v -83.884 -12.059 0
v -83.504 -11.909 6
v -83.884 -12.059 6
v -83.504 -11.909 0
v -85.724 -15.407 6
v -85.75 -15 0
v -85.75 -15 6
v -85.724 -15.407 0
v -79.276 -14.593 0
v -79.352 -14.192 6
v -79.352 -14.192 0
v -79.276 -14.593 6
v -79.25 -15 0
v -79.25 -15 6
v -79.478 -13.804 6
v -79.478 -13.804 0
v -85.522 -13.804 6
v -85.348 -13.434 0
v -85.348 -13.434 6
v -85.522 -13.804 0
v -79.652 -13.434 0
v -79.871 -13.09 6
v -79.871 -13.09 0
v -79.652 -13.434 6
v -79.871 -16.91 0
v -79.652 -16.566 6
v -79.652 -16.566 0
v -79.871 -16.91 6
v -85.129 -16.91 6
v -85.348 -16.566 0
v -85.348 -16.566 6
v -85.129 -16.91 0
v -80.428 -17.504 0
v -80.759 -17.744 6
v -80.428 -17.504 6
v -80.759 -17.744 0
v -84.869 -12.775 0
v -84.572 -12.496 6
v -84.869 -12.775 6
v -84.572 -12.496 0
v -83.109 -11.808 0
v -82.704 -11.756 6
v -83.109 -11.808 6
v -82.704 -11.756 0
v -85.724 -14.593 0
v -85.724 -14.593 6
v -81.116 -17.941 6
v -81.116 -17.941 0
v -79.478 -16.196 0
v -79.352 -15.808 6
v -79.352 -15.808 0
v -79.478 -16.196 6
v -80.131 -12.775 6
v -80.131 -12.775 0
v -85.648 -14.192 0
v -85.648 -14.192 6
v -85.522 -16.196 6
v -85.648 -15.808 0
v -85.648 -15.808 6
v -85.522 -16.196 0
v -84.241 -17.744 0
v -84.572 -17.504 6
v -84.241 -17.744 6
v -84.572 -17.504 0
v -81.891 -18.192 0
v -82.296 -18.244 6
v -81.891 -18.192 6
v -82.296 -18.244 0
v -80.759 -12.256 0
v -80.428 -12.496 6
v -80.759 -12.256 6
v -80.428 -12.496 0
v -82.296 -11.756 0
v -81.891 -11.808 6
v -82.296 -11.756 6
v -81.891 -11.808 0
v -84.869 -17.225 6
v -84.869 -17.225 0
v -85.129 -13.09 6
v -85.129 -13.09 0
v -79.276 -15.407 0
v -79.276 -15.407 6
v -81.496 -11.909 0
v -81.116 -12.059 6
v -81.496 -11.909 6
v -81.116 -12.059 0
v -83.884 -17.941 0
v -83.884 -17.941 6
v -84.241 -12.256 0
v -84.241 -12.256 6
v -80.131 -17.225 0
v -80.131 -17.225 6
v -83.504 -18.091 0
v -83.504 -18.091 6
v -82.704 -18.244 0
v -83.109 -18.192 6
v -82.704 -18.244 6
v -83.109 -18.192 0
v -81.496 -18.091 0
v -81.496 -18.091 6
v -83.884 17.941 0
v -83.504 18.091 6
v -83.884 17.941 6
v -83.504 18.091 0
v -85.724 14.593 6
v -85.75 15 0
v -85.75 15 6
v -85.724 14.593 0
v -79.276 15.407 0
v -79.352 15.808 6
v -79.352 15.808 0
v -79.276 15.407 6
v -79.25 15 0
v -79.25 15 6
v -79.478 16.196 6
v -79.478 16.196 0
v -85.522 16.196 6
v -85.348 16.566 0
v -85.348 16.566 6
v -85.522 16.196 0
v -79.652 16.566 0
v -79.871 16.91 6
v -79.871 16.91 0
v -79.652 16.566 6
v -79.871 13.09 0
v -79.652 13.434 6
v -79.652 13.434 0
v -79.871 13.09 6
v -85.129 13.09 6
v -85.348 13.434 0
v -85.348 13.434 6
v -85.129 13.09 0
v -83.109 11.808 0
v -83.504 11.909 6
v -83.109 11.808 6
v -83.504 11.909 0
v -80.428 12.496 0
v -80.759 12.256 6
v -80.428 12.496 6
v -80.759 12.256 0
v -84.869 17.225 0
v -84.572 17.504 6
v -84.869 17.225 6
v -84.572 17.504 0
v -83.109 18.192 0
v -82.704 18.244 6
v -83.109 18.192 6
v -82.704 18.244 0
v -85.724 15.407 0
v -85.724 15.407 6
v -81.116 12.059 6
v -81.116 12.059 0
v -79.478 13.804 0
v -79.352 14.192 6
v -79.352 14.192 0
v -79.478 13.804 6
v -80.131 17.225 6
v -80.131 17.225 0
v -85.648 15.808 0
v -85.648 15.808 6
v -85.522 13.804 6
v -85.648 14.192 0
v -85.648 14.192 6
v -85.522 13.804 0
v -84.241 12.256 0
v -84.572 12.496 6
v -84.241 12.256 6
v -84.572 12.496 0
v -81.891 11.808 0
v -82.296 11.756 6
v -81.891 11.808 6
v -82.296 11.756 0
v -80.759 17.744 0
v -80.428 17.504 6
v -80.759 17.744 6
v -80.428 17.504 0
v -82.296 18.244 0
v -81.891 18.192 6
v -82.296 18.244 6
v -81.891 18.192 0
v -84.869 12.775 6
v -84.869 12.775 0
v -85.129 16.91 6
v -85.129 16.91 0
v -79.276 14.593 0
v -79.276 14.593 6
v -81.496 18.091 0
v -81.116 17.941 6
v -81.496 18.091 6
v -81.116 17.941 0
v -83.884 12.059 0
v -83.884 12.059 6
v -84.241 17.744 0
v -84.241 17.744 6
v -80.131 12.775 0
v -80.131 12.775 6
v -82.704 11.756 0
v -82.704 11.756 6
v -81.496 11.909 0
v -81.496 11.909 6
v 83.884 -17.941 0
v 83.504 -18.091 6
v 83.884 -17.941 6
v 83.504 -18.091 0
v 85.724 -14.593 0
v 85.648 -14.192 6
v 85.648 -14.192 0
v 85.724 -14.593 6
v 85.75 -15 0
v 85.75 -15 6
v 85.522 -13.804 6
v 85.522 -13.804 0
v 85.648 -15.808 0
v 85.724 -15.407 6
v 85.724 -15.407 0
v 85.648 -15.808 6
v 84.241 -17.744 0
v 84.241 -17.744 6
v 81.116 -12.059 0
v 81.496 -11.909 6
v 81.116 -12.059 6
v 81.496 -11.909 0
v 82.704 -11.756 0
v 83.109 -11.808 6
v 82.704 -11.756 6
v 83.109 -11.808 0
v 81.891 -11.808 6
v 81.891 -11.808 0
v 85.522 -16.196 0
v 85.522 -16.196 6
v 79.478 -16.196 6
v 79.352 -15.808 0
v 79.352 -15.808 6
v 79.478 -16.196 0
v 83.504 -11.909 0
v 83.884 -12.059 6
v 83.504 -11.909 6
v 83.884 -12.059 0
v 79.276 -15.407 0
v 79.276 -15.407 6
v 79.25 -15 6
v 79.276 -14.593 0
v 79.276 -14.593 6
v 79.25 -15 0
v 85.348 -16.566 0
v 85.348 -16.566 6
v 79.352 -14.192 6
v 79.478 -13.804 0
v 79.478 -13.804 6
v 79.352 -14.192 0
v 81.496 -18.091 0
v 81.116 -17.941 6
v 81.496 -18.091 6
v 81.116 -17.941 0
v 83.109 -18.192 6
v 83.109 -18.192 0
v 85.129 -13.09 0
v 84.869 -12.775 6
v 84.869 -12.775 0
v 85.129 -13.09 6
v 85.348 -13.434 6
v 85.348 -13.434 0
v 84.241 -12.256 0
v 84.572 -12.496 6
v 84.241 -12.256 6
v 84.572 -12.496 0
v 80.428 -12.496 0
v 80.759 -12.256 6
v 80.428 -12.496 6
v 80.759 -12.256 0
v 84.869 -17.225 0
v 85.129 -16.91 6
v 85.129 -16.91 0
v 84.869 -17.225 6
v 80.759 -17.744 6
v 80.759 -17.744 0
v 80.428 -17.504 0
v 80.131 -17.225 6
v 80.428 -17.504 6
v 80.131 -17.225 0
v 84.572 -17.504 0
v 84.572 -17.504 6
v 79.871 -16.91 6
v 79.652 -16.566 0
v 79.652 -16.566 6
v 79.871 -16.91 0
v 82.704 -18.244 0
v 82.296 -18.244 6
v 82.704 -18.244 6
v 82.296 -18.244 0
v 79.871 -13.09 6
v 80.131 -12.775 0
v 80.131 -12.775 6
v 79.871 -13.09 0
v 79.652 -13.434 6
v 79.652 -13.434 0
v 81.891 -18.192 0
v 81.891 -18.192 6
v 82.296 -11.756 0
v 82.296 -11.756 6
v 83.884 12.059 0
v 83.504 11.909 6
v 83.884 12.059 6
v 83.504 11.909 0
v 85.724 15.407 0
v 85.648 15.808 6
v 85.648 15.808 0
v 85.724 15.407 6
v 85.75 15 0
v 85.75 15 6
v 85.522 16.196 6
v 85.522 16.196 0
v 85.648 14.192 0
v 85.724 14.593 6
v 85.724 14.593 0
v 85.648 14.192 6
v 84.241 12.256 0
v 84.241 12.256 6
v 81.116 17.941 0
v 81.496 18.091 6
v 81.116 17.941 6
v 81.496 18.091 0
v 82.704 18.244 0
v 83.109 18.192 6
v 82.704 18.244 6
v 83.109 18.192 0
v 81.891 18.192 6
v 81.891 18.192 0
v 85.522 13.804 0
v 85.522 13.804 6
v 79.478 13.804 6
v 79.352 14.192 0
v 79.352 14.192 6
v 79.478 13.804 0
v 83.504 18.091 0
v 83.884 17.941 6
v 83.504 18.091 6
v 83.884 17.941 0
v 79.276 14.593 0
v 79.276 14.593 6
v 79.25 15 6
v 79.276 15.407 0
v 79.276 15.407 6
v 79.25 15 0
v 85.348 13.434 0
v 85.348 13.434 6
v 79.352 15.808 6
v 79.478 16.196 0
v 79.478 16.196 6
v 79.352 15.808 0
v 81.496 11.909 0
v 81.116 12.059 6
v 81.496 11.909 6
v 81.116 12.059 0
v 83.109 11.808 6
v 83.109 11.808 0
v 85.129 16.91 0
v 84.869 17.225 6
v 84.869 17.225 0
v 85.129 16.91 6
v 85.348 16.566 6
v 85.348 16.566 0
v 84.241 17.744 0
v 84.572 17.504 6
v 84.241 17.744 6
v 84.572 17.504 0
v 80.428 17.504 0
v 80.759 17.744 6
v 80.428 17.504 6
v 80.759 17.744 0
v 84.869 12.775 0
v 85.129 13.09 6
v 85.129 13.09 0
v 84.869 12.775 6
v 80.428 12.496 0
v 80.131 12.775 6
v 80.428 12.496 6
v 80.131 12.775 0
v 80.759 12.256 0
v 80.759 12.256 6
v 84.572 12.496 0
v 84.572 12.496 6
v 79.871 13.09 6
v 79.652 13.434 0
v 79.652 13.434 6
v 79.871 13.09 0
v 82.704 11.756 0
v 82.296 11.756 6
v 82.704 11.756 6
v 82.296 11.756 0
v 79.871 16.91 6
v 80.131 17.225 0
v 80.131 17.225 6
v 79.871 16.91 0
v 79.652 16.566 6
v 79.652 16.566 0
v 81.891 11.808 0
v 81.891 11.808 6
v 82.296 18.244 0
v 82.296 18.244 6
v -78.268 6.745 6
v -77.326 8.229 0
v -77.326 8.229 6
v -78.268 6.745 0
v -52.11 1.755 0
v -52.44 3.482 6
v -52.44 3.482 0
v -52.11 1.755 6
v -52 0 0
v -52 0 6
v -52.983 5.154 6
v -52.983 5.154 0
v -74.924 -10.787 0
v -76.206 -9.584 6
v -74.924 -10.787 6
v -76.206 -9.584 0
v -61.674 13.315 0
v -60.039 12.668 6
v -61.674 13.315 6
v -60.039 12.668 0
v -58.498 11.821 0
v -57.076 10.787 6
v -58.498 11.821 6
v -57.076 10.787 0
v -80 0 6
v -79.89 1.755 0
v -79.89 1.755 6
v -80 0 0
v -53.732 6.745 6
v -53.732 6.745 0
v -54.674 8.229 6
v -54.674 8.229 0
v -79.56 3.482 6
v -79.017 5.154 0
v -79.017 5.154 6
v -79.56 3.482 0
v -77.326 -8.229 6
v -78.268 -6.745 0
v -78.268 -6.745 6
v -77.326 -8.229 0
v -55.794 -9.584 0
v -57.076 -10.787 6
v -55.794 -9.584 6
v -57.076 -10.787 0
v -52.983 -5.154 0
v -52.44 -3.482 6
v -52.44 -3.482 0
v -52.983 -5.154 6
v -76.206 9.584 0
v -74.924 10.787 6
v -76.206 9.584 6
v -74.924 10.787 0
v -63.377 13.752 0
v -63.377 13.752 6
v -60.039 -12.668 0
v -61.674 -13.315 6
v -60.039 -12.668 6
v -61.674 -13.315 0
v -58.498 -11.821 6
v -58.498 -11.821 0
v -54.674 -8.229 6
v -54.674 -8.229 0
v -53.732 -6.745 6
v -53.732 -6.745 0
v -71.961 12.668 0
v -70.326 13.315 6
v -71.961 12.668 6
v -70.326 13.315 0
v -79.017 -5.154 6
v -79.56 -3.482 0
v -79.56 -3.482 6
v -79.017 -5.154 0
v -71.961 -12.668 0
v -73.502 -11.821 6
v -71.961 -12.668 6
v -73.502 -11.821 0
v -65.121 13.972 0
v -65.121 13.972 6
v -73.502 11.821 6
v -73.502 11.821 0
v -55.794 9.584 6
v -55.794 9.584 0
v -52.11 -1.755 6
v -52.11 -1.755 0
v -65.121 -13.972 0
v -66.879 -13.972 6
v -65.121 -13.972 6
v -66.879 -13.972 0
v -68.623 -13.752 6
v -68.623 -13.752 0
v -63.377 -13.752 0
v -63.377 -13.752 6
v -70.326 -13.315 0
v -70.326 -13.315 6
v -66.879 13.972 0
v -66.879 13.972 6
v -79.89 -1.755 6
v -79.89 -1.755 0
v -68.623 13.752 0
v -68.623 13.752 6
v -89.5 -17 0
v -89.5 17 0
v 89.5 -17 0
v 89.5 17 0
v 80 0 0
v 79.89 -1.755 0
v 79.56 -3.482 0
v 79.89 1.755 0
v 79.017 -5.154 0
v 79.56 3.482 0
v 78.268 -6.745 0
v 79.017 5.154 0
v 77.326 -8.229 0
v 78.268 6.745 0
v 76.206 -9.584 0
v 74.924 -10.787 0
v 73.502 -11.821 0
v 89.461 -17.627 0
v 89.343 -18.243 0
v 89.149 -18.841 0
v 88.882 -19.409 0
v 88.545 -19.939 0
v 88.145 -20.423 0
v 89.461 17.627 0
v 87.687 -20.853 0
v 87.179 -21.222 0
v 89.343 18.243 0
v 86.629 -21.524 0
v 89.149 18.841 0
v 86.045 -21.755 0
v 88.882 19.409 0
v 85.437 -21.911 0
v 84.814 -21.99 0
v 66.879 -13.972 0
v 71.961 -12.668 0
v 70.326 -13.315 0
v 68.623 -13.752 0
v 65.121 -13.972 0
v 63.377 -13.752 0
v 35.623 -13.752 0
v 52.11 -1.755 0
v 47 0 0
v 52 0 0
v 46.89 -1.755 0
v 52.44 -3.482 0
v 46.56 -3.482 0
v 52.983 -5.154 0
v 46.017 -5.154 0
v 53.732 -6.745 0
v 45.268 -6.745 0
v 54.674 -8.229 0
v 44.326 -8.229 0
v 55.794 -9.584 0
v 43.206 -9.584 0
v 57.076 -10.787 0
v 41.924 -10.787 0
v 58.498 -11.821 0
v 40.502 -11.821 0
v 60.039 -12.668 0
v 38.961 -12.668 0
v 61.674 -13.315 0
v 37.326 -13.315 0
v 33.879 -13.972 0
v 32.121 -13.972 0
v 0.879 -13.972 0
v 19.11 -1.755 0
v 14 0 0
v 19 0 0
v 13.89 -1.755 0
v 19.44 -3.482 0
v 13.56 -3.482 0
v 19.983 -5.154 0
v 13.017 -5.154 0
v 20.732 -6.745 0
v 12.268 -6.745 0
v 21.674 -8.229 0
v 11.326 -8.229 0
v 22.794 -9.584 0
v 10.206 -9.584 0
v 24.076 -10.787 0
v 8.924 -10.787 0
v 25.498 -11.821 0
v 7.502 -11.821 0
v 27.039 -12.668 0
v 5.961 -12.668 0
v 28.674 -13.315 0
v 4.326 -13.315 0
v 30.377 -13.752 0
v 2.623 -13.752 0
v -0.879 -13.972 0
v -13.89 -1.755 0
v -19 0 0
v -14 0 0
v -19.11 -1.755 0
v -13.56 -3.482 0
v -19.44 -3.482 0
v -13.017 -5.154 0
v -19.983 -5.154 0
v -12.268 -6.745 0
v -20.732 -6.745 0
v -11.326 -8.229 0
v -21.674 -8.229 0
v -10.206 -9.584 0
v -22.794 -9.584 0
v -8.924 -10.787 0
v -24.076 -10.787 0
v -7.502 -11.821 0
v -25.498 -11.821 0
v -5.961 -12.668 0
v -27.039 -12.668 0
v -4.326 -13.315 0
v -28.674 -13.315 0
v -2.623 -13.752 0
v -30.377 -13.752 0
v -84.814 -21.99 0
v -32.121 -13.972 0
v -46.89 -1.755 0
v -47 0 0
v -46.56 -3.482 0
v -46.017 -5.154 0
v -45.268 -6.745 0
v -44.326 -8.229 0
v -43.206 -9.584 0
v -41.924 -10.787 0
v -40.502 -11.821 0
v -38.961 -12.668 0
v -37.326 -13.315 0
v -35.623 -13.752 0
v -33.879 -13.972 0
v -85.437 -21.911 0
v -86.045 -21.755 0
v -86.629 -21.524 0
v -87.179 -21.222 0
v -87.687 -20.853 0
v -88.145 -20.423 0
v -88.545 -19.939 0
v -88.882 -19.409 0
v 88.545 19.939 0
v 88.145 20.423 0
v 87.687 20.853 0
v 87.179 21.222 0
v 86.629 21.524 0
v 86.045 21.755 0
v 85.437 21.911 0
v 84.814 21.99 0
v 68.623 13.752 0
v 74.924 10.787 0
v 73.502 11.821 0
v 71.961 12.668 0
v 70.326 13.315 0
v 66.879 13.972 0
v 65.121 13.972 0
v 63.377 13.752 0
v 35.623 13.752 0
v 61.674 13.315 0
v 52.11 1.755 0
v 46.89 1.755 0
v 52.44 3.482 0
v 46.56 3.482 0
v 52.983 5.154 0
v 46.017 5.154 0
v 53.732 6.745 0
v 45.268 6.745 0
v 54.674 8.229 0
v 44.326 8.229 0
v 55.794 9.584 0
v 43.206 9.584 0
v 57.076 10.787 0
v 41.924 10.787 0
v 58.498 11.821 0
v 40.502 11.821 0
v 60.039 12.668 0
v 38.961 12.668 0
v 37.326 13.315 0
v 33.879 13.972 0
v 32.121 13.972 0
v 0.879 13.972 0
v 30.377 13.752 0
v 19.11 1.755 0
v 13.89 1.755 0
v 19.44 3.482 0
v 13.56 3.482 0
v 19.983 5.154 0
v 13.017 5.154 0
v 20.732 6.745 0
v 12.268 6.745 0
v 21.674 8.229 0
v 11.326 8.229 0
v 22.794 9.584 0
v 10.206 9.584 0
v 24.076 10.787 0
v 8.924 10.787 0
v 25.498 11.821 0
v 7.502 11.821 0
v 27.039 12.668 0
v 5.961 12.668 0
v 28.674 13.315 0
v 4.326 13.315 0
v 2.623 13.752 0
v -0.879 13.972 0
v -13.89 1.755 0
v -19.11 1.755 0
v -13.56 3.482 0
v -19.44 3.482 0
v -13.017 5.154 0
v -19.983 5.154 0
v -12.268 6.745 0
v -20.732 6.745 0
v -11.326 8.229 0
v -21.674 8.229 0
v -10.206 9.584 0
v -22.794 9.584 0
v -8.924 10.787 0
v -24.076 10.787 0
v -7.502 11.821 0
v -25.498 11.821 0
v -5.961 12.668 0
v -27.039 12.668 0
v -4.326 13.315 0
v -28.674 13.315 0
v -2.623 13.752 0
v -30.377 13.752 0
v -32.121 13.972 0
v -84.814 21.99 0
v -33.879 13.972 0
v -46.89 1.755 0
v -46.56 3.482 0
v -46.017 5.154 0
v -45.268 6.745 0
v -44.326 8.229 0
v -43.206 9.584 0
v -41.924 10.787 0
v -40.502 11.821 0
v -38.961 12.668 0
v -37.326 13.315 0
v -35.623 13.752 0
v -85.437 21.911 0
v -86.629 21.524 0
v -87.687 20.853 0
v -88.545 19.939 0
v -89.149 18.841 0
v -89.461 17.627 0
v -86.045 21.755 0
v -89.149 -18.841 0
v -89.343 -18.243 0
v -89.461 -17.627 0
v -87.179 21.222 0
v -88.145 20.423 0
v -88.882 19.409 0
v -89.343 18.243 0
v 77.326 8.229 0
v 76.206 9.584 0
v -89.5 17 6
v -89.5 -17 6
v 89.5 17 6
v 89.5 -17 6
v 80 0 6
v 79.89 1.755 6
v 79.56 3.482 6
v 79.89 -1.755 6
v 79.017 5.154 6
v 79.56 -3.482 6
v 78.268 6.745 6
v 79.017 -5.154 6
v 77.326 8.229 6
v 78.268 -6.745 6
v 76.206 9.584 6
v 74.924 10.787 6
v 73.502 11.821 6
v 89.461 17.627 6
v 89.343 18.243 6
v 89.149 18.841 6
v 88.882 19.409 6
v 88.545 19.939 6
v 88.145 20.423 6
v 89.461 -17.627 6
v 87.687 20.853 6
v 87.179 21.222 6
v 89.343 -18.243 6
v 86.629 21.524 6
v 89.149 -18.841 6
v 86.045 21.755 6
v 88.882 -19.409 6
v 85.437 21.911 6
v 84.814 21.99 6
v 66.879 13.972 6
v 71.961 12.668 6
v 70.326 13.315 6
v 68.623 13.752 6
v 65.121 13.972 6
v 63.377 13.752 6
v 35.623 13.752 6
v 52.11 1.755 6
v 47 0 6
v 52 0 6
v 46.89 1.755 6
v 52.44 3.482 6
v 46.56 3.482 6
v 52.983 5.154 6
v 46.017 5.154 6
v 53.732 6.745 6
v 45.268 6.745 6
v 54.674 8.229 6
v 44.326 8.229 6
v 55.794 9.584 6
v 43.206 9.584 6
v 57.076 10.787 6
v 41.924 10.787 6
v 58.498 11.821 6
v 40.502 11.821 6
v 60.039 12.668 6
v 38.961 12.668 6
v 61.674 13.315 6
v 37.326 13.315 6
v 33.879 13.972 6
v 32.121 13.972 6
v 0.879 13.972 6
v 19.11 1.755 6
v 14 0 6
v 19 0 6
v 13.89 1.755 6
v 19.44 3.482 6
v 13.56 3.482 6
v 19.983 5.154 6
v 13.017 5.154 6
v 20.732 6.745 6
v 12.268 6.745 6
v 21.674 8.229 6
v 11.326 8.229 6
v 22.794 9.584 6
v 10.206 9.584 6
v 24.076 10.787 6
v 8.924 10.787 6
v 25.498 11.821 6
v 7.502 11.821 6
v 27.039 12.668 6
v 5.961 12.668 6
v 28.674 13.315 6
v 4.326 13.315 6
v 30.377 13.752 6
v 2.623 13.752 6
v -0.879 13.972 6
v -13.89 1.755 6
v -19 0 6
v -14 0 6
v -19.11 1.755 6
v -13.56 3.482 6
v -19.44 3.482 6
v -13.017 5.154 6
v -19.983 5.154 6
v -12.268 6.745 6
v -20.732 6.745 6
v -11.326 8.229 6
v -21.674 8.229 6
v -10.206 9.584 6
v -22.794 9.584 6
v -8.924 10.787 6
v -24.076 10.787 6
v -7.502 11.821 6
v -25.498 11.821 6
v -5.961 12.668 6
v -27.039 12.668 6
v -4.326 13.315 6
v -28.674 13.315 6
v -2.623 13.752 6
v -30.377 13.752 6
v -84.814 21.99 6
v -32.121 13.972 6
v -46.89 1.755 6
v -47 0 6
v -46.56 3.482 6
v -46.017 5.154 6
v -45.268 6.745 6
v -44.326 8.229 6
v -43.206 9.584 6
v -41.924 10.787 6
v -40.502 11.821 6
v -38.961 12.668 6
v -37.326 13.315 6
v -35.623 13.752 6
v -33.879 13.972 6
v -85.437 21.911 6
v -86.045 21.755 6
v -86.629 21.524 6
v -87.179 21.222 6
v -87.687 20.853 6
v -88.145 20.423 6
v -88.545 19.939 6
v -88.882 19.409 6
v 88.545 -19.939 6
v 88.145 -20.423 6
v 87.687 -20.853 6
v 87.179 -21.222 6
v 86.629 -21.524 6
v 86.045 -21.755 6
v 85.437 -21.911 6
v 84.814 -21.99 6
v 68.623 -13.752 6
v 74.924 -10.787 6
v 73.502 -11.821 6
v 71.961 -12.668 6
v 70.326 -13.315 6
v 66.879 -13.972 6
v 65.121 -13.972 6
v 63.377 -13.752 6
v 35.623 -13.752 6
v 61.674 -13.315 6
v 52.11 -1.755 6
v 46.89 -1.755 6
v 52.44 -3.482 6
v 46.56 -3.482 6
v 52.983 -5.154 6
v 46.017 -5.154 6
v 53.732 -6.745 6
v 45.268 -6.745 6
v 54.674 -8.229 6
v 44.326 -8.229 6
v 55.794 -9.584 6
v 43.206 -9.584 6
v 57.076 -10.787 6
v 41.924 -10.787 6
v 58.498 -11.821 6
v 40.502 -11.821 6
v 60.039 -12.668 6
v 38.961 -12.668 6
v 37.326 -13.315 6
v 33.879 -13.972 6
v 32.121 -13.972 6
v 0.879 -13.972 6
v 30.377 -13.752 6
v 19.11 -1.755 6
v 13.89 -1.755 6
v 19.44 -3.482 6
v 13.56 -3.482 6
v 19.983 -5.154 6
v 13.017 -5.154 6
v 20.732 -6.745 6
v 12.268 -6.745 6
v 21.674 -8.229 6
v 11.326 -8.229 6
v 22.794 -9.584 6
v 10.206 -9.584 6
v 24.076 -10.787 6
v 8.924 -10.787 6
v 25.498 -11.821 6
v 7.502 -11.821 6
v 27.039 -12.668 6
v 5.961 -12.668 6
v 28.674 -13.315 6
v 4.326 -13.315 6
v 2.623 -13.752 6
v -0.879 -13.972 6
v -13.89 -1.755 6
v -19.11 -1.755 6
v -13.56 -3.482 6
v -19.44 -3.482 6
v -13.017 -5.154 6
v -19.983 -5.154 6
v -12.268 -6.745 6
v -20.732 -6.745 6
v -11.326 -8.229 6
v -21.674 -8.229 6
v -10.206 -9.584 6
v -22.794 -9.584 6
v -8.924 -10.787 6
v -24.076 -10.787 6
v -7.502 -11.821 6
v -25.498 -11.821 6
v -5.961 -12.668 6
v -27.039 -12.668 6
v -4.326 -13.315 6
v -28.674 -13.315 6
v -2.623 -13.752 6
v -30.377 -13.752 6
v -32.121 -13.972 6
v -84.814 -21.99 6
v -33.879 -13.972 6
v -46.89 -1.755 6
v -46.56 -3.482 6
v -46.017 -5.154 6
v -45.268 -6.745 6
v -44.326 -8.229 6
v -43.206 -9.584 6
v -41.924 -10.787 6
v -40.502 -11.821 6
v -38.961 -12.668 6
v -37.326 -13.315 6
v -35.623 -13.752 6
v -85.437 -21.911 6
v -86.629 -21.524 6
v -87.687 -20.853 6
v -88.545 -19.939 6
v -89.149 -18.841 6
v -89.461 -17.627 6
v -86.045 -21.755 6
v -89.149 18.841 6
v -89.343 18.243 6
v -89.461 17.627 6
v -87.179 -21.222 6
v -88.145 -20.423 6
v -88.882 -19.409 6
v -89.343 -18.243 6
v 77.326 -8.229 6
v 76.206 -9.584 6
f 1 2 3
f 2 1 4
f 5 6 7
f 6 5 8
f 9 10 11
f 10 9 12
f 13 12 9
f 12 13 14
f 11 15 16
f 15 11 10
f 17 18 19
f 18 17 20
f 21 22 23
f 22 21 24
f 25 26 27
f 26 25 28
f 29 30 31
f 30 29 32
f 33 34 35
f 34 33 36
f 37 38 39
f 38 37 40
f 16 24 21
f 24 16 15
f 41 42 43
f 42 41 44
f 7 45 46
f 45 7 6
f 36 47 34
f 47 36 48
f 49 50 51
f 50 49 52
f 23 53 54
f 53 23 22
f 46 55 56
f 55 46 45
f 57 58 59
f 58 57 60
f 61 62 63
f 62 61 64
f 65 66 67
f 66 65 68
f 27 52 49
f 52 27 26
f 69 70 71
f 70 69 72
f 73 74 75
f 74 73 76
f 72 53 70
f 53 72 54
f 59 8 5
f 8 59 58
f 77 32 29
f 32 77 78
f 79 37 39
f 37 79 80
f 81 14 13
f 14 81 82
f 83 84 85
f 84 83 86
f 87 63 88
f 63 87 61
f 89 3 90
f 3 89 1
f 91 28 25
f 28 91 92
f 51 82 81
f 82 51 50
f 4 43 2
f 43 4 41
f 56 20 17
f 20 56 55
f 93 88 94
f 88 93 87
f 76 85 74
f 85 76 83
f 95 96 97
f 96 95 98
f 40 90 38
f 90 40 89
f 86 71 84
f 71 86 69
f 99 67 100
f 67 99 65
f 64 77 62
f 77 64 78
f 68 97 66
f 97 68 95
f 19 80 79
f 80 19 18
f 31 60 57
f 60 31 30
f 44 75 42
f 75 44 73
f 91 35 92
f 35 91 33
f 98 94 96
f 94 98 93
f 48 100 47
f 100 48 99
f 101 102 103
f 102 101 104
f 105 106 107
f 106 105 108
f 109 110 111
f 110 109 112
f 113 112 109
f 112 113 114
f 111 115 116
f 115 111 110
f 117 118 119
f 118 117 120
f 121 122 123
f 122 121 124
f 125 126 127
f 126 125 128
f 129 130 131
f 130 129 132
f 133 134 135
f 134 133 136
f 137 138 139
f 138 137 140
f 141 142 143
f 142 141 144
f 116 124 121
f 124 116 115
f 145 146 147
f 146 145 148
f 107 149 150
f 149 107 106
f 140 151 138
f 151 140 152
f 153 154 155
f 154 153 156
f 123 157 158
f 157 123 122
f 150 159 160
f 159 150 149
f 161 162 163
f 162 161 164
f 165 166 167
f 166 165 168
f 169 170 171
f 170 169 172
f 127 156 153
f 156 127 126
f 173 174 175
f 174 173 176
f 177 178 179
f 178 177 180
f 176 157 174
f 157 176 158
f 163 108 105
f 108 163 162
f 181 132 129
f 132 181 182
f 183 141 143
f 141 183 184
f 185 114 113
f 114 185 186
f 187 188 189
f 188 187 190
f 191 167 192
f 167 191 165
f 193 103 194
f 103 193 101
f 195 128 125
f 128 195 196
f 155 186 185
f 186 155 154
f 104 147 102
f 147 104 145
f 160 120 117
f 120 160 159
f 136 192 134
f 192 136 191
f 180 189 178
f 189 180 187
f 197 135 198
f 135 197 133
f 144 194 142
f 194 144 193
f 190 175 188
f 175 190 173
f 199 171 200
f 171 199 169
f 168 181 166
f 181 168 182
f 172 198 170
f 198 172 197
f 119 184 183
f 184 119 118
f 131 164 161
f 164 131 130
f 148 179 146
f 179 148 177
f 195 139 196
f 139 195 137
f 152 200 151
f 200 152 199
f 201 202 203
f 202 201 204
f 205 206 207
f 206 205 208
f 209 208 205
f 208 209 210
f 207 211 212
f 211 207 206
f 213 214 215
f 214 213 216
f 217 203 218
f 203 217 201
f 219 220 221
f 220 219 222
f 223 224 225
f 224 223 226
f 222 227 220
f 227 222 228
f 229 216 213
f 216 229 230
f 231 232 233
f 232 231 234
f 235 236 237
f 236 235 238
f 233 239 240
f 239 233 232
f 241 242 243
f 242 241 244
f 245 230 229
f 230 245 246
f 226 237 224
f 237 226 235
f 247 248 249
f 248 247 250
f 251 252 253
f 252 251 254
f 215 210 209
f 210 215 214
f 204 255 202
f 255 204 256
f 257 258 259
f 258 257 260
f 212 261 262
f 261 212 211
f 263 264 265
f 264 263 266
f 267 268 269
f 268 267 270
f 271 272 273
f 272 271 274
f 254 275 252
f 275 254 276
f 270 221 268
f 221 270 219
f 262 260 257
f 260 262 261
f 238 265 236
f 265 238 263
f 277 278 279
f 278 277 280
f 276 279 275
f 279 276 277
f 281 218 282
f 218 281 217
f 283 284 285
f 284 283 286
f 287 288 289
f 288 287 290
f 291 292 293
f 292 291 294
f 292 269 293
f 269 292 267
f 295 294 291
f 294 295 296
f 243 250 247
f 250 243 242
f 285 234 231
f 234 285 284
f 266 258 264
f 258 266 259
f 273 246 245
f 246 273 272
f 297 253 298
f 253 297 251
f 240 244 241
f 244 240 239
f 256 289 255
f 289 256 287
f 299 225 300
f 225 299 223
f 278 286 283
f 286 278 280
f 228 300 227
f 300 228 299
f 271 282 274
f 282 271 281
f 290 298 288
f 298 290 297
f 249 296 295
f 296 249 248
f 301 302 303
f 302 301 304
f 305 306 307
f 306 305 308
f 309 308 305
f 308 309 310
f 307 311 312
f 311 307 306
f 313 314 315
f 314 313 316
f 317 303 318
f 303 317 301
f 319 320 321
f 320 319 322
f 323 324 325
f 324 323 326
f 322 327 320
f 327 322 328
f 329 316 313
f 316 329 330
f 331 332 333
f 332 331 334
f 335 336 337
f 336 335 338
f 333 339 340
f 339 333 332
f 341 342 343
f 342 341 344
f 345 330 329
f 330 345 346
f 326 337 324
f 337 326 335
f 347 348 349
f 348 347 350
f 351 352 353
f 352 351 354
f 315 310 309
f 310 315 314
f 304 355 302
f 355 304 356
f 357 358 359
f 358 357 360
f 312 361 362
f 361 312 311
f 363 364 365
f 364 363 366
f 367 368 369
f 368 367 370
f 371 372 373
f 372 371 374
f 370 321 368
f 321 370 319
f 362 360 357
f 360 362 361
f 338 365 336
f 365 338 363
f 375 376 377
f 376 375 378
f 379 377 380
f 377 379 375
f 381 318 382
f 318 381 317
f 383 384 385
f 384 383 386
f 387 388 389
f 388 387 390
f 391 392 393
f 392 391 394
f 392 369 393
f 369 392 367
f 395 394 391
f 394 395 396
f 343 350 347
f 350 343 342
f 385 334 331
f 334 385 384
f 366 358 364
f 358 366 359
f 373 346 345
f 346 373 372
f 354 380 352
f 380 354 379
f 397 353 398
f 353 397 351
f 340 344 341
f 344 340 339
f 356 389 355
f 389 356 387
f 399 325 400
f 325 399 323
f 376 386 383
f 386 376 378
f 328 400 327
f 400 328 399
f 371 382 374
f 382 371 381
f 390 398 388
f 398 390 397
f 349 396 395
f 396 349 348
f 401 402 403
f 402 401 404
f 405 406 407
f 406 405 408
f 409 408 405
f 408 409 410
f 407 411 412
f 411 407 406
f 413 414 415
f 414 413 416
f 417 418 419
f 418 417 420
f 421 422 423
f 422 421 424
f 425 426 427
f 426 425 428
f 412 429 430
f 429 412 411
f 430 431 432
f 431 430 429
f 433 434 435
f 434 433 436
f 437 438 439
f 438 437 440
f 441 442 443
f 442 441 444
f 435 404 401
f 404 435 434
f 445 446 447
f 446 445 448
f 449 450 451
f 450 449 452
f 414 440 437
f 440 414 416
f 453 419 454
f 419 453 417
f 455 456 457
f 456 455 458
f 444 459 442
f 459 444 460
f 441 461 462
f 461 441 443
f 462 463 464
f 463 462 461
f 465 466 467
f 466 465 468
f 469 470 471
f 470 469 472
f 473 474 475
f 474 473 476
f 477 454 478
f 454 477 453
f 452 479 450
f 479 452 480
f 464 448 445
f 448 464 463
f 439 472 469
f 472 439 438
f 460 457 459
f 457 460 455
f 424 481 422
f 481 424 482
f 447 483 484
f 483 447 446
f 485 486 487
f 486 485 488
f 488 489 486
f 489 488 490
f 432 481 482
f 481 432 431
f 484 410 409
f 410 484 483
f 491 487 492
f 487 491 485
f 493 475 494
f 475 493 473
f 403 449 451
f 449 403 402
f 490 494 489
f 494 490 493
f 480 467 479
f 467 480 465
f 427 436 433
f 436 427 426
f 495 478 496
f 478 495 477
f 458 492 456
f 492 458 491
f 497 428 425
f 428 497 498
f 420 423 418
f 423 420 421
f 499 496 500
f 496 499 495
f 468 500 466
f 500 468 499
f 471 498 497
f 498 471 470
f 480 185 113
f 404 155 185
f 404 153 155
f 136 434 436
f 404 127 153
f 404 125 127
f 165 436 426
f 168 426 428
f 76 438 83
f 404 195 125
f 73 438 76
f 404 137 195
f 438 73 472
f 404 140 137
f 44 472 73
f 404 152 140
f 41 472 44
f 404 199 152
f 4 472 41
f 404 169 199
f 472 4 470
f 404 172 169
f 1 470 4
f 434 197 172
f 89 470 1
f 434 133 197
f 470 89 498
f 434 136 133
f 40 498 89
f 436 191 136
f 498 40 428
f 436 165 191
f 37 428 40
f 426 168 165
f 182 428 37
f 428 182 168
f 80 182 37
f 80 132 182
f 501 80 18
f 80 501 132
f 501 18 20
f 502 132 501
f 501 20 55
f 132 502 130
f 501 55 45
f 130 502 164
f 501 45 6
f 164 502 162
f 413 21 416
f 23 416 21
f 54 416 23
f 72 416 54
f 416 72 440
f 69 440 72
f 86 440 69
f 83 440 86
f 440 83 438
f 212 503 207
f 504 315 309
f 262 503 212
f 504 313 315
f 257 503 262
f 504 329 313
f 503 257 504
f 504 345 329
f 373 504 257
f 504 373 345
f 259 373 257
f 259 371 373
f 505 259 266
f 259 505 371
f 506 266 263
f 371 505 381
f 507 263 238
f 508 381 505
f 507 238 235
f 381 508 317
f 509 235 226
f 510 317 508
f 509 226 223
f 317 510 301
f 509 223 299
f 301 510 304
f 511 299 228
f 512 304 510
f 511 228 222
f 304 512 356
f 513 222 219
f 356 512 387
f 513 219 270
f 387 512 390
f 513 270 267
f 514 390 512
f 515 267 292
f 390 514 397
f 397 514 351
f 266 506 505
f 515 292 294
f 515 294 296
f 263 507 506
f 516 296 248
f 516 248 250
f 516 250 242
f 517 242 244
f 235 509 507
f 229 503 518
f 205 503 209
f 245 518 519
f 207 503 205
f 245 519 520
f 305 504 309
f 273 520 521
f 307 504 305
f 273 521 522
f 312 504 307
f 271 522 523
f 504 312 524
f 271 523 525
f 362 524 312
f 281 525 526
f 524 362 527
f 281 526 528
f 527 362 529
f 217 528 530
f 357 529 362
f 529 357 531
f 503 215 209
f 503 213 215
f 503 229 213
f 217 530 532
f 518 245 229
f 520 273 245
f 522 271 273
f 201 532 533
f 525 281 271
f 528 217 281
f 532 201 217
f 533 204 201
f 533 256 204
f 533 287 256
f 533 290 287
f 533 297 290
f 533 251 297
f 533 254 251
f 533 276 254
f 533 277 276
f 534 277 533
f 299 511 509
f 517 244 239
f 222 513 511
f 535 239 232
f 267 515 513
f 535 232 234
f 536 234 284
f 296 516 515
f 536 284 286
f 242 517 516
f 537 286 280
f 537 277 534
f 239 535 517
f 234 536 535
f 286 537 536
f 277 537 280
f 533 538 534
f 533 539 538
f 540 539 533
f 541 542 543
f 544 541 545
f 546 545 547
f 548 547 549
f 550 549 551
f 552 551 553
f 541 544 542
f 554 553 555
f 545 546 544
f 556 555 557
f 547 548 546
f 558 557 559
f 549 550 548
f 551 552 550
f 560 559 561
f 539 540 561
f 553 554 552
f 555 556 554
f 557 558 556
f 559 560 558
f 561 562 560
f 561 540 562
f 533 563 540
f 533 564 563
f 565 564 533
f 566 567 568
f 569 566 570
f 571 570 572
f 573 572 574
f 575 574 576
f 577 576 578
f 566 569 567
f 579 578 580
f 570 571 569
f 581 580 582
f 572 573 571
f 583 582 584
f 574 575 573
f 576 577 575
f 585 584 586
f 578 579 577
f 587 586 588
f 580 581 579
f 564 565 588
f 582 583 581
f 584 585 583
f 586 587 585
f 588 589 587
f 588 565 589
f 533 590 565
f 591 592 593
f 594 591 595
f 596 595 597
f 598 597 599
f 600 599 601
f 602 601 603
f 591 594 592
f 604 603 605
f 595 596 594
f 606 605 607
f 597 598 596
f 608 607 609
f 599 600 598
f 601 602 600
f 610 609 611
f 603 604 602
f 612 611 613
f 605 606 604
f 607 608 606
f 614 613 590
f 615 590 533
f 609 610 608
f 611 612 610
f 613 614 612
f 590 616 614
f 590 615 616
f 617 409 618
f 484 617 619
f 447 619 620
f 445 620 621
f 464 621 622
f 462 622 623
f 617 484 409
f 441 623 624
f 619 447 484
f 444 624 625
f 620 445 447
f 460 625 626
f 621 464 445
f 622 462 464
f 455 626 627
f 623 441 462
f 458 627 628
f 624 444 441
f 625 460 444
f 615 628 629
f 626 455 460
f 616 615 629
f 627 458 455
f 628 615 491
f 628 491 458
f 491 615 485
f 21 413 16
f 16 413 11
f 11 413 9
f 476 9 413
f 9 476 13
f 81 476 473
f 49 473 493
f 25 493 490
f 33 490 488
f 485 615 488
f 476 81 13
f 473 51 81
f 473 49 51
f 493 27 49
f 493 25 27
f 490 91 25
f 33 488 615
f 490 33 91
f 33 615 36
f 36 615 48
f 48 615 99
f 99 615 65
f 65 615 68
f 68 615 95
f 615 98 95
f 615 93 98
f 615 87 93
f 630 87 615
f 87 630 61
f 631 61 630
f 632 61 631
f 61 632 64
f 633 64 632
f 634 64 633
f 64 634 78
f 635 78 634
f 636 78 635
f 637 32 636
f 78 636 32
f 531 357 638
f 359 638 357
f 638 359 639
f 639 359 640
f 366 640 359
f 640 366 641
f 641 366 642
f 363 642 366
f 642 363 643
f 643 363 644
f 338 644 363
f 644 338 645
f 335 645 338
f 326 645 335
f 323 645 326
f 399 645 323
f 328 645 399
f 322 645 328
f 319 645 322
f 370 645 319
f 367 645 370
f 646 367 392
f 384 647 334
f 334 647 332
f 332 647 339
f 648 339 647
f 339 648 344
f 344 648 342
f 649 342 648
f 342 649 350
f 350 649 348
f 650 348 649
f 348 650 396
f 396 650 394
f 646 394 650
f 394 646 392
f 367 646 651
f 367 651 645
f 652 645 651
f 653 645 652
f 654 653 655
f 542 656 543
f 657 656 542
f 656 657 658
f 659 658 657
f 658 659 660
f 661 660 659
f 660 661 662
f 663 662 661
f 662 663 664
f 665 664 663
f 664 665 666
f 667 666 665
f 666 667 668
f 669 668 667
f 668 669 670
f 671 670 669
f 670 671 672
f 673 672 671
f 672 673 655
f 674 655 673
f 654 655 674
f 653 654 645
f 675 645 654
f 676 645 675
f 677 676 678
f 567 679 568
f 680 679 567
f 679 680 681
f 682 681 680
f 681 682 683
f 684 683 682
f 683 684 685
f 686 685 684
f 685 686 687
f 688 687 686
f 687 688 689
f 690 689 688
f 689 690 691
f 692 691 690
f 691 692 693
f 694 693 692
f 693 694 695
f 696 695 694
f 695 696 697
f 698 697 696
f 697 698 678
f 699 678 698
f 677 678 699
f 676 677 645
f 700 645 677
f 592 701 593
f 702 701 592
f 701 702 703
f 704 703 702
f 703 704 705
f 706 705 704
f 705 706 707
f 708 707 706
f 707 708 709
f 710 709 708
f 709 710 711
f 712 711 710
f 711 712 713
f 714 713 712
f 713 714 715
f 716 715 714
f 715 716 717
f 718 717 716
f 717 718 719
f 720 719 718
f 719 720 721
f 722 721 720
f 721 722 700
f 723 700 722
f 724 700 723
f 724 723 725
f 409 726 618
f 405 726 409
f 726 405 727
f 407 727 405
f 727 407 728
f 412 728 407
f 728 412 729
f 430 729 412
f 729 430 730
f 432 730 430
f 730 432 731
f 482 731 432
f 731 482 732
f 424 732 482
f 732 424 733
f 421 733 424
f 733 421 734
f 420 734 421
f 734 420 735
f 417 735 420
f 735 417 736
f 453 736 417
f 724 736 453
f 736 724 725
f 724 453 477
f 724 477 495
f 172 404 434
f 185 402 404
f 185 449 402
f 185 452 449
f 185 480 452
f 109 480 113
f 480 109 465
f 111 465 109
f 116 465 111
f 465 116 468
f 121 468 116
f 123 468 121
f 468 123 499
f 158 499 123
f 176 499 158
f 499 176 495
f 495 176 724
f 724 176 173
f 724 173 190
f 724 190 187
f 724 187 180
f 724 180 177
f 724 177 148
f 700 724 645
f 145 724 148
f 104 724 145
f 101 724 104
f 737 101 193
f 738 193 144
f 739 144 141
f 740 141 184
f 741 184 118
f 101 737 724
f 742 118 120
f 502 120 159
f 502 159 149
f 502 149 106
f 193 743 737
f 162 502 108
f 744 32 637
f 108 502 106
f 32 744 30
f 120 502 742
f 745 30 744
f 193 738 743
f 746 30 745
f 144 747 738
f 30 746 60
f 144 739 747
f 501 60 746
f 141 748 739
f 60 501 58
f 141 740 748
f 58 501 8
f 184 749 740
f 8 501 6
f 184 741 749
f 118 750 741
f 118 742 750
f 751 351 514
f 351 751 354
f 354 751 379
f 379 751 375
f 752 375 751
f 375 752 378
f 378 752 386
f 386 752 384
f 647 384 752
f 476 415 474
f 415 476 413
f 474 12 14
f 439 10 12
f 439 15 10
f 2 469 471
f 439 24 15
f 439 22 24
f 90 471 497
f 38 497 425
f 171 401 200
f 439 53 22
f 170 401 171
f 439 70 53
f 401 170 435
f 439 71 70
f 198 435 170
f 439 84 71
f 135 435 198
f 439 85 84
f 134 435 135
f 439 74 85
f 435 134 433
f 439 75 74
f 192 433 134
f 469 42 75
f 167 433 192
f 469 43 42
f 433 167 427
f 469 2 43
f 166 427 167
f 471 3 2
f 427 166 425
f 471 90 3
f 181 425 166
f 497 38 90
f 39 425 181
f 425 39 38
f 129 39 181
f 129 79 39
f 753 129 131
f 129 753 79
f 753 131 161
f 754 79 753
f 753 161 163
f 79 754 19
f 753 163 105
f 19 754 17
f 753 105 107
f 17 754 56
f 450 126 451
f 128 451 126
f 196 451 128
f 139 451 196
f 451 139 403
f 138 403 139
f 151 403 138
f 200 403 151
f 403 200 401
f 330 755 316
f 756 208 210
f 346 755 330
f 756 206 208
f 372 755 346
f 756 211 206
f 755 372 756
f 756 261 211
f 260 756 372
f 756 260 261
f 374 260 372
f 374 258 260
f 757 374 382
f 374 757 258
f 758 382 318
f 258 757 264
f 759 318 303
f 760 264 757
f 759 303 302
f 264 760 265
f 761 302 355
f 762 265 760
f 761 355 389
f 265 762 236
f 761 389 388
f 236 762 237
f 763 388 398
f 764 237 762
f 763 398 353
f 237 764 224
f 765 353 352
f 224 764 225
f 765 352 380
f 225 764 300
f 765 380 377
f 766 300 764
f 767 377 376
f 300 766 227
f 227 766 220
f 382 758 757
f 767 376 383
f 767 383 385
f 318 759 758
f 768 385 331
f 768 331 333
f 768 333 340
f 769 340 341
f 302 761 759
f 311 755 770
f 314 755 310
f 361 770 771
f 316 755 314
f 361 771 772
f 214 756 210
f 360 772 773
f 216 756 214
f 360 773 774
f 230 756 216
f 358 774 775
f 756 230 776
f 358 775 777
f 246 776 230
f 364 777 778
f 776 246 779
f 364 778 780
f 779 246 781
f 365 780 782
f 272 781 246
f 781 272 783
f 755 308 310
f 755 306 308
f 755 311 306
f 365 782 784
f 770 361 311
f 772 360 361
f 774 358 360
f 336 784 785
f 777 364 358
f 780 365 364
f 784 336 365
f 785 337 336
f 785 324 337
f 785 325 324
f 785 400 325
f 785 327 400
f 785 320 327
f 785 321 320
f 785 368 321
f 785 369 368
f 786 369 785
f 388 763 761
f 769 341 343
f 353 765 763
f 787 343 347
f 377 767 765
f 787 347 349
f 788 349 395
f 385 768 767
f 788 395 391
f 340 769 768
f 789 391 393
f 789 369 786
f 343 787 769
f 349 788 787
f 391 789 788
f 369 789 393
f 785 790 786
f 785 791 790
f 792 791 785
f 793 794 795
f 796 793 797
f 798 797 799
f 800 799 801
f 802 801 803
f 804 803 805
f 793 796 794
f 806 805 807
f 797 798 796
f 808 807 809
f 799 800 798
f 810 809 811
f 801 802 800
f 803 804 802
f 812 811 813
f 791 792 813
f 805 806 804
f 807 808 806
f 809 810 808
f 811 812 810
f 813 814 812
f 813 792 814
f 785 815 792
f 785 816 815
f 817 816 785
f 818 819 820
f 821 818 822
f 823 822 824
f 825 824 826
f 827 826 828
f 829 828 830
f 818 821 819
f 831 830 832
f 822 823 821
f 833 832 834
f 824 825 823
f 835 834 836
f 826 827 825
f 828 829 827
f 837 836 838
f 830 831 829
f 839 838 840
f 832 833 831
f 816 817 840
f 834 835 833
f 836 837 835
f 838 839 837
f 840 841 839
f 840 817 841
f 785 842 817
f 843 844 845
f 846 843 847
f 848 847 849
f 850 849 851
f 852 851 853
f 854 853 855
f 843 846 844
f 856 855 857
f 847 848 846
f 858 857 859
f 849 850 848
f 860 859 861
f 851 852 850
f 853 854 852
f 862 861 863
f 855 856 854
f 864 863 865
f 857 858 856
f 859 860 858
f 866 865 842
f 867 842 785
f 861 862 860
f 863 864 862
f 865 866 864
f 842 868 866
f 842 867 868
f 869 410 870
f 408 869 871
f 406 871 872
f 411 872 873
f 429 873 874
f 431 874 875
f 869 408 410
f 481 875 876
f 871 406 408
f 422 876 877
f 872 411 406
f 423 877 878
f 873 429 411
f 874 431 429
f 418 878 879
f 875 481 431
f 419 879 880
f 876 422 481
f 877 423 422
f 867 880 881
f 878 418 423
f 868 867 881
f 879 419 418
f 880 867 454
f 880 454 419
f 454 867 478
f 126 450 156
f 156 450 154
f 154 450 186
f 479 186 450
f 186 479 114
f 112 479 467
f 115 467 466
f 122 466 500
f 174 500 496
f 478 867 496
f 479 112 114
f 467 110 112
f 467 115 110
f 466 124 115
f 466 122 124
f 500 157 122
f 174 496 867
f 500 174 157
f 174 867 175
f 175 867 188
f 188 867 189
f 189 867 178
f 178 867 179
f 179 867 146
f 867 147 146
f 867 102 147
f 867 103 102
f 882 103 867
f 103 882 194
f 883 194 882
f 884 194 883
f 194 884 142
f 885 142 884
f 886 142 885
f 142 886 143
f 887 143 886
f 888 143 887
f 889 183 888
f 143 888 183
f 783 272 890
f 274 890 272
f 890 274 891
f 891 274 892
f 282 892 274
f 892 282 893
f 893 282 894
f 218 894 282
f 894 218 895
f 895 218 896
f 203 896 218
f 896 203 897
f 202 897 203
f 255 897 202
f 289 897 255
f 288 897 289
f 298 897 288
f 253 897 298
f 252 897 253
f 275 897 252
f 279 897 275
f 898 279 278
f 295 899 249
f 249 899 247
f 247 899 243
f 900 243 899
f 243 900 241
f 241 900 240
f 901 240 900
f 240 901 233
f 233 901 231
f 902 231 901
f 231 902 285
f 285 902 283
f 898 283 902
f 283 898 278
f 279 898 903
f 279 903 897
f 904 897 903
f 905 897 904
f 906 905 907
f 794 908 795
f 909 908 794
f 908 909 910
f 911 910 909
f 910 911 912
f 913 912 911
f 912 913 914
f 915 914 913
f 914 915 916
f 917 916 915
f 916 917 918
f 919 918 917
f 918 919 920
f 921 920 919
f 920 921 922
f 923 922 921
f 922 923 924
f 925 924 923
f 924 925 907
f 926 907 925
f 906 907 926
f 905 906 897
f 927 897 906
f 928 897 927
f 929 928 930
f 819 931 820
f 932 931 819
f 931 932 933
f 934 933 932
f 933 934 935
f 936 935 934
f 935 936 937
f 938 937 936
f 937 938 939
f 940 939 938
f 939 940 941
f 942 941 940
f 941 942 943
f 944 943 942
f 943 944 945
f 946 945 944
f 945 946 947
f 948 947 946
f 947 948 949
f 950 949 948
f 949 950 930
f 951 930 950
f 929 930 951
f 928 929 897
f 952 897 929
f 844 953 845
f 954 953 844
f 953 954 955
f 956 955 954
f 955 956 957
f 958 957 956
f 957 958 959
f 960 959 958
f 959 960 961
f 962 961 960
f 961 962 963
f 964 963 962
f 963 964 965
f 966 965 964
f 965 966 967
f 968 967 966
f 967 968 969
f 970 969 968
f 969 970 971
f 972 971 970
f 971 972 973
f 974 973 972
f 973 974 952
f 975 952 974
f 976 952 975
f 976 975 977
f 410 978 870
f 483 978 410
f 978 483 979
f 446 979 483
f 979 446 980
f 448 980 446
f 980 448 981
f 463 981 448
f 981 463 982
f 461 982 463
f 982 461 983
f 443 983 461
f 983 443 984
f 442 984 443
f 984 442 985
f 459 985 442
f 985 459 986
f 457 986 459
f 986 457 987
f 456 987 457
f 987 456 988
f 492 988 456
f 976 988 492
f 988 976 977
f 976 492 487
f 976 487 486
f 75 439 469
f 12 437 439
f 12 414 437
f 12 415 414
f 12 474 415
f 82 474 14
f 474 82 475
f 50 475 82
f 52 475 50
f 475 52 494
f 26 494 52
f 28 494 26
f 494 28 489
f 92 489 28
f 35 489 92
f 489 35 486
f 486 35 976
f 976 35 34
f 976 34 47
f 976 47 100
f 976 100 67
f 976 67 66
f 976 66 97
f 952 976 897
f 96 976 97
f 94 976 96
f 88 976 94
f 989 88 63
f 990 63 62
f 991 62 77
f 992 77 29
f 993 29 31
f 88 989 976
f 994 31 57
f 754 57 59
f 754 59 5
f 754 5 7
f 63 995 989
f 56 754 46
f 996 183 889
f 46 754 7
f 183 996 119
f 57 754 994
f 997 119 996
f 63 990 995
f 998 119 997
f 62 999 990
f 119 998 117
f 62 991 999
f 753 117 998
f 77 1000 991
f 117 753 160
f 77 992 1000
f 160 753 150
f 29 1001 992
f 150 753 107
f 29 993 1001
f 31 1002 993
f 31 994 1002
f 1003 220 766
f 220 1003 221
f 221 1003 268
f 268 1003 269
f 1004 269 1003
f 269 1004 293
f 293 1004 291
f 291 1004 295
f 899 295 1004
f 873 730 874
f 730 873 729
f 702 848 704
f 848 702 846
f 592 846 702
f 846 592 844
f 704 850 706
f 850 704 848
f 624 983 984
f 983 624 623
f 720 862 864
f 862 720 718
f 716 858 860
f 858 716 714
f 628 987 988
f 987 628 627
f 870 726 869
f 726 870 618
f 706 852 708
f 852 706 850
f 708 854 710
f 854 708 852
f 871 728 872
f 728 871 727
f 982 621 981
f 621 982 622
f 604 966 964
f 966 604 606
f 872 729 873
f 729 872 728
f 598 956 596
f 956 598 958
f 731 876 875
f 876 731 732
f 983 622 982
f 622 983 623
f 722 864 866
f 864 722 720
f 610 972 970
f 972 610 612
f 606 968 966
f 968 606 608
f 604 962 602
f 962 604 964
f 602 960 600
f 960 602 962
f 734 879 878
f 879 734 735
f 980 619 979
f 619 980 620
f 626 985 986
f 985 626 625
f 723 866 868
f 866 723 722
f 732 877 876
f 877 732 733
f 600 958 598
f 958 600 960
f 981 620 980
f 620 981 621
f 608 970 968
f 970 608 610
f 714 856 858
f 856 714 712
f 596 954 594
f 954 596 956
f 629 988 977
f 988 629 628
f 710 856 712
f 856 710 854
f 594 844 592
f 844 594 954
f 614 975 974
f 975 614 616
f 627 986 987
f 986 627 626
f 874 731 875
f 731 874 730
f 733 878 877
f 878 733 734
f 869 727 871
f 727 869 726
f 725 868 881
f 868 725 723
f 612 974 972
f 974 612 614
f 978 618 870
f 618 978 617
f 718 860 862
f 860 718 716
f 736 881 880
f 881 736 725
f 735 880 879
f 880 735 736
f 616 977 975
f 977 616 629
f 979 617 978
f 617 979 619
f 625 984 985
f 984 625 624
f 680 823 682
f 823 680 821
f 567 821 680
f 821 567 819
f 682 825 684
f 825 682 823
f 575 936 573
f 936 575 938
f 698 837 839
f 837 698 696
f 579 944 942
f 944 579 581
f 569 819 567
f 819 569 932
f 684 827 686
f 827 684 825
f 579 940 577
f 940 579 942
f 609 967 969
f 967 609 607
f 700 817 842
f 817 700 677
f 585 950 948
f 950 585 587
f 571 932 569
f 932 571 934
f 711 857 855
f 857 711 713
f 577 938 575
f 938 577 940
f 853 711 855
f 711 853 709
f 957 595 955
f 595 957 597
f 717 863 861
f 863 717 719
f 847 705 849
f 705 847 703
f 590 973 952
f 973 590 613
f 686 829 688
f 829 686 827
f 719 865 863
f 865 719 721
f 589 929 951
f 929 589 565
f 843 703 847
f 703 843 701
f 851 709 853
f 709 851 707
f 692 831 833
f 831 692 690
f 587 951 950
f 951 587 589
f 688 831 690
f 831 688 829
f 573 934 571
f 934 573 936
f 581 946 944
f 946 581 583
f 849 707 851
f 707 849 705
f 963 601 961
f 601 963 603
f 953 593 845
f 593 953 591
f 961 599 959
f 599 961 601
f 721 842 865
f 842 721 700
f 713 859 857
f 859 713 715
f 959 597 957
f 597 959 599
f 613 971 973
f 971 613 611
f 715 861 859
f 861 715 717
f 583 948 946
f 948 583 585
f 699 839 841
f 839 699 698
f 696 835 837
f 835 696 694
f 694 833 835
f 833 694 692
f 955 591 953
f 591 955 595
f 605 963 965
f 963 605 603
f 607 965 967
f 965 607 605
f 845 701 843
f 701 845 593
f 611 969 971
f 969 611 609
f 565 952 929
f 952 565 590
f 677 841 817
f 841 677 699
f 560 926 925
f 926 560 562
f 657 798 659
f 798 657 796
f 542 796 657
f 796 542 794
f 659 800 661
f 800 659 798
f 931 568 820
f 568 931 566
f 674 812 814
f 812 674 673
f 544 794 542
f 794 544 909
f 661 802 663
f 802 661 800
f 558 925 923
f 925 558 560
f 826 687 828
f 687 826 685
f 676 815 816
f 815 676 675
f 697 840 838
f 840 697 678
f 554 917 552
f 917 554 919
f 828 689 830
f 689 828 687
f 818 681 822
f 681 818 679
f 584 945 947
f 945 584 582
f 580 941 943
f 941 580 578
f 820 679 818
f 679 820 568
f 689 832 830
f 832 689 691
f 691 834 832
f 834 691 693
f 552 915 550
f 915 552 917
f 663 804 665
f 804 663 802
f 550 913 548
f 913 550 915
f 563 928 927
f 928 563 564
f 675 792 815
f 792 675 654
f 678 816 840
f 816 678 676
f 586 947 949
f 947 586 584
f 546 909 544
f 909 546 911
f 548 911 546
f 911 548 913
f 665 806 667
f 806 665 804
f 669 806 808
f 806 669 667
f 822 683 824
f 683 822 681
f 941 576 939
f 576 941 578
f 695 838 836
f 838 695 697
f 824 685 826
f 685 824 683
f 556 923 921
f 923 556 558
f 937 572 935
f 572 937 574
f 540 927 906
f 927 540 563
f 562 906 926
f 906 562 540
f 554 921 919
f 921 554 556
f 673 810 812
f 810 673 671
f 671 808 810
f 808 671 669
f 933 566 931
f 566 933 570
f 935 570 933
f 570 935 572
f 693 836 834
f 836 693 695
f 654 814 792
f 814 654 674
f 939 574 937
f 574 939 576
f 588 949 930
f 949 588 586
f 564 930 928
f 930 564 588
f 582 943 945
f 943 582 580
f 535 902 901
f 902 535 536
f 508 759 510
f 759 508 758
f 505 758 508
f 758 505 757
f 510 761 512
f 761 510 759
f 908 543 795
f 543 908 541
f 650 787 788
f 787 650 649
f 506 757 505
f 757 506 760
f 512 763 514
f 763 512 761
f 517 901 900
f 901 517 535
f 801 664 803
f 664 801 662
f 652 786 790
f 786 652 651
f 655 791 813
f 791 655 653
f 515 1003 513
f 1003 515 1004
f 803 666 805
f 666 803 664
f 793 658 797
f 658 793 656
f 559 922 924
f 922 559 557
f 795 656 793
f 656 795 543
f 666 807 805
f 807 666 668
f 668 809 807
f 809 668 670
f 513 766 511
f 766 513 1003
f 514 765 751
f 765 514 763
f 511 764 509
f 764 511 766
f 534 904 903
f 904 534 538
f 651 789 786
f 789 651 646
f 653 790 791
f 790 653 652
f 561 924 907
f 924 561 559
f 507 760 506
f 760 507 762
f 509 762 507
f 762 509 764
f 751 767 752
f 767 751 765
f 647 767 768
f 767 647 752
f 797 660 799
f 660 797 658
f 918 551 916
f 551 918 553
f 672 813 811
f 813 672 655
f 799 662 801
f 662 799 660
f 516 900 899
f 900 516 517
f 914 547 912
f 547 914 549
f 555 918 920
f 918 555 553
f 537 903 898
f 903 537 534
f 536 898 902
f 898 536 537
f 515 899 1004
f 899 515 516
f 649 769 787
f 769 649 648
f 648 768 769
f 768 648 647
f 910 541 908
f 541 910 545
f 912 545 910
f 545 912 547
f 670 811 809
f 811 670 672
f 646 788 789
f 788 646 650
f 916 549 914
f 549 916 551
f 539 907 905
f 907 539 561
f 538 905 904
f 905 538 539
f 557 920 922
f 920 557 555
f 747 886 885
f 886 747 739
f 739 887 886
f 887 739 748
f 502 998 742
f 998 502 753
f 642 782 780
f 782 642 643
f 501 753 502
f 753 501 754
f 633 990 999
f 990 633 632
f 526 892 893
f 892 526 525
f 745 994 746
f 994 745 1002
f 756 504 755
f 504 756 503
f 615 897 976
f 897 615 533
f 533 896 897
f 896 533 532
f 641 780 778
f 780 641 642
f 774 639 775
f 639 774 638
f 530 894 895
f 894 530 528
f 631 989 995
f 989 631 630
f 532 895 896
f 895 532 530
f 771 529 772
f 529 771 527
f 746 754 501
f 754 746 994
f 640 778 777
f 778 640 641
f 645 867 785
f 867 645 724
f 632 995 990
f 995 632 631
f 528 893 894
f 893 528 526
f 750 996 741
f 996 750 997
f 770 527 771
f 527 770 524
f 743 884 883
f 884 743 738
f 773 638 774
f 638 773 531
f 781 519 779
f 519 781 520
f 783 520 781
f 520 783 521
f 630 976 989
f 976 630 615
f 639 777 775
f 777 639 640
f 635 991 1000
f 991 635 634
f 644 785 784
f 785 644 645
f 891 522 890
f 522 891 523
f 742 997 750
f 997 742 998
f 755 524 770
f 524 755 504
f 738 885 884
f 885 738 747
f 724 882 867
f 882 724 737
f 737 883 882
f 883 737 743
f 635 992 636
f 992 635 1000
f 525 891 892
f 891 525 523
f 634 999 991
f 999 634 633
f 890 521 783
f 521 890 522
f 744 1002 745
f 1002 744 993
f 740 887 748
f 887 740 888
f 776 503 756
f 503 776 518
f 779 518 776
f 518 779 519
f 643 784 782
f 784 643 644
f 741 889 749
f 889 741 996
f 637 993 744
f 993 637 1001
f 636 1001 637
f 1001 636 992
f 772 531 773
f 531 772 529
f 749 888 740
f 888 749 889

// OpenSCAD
$fn = 50;


difference() {
	union() {
		hull() {
			translate(v = [-84.5000000000, 17.0000000000, 0]) {
				cylinder(h = 6, r = 5);
			}
			translate(v = [84.5000000000, 17.0000000000, 0]) {
				cylinder(h = 6, r = 5);
			}
			translate(v = [-84.5000000000, -17.0000000000, 0]) {
				cylinder(h = 6, r = 5);
			}
			translate(v = [84.5000000000, -17.0000000000, 0]) {
				cylinder(h = 6, r = 5);
			}
		}
	}
	union() {
		#translate(v = [-82.5000000000, -15.0000000000, -100.0000000000]) {
			cylinder(h = 200, r = 3.2500000000);
		}
		#translate(v = [-82.5000000000, 15.0000000000, -100.0000000000]) {
			cylinder(h = 200, r = 3.2500000000);
		}
		#translate(v = [82.5000000000, -15.0000000000, -100.0000000000]) {
			cylinder(h = 200, r = 3.2500000000);
		}
		#translate(v = [82.5000000000, 15.0000000000, -100.0000000000]) {
			cylinder(h = 200, r = 3.2500000000);
		}
		#translate(v = [-66.0000000000, 0, 0]) {
			cylinder(h = 6, r = 14.0000000000);
		}
		#translate(v = [-33.0000000000, 0, 0]) {
			cylinder(h = 6, r = 14.0000000000);
		}
		#cylinder(h = 6, r = 14.0000000000);
		#translate(v = [33.0000000000, 0, 0]) {
			cylinder(h = 6, r = 14.0000000000);
		}
		#translate(v = [66.0000000000, 0, 0]) {
			cylinder(h = 6, r = 14.0000000000);
		}
	}
}
